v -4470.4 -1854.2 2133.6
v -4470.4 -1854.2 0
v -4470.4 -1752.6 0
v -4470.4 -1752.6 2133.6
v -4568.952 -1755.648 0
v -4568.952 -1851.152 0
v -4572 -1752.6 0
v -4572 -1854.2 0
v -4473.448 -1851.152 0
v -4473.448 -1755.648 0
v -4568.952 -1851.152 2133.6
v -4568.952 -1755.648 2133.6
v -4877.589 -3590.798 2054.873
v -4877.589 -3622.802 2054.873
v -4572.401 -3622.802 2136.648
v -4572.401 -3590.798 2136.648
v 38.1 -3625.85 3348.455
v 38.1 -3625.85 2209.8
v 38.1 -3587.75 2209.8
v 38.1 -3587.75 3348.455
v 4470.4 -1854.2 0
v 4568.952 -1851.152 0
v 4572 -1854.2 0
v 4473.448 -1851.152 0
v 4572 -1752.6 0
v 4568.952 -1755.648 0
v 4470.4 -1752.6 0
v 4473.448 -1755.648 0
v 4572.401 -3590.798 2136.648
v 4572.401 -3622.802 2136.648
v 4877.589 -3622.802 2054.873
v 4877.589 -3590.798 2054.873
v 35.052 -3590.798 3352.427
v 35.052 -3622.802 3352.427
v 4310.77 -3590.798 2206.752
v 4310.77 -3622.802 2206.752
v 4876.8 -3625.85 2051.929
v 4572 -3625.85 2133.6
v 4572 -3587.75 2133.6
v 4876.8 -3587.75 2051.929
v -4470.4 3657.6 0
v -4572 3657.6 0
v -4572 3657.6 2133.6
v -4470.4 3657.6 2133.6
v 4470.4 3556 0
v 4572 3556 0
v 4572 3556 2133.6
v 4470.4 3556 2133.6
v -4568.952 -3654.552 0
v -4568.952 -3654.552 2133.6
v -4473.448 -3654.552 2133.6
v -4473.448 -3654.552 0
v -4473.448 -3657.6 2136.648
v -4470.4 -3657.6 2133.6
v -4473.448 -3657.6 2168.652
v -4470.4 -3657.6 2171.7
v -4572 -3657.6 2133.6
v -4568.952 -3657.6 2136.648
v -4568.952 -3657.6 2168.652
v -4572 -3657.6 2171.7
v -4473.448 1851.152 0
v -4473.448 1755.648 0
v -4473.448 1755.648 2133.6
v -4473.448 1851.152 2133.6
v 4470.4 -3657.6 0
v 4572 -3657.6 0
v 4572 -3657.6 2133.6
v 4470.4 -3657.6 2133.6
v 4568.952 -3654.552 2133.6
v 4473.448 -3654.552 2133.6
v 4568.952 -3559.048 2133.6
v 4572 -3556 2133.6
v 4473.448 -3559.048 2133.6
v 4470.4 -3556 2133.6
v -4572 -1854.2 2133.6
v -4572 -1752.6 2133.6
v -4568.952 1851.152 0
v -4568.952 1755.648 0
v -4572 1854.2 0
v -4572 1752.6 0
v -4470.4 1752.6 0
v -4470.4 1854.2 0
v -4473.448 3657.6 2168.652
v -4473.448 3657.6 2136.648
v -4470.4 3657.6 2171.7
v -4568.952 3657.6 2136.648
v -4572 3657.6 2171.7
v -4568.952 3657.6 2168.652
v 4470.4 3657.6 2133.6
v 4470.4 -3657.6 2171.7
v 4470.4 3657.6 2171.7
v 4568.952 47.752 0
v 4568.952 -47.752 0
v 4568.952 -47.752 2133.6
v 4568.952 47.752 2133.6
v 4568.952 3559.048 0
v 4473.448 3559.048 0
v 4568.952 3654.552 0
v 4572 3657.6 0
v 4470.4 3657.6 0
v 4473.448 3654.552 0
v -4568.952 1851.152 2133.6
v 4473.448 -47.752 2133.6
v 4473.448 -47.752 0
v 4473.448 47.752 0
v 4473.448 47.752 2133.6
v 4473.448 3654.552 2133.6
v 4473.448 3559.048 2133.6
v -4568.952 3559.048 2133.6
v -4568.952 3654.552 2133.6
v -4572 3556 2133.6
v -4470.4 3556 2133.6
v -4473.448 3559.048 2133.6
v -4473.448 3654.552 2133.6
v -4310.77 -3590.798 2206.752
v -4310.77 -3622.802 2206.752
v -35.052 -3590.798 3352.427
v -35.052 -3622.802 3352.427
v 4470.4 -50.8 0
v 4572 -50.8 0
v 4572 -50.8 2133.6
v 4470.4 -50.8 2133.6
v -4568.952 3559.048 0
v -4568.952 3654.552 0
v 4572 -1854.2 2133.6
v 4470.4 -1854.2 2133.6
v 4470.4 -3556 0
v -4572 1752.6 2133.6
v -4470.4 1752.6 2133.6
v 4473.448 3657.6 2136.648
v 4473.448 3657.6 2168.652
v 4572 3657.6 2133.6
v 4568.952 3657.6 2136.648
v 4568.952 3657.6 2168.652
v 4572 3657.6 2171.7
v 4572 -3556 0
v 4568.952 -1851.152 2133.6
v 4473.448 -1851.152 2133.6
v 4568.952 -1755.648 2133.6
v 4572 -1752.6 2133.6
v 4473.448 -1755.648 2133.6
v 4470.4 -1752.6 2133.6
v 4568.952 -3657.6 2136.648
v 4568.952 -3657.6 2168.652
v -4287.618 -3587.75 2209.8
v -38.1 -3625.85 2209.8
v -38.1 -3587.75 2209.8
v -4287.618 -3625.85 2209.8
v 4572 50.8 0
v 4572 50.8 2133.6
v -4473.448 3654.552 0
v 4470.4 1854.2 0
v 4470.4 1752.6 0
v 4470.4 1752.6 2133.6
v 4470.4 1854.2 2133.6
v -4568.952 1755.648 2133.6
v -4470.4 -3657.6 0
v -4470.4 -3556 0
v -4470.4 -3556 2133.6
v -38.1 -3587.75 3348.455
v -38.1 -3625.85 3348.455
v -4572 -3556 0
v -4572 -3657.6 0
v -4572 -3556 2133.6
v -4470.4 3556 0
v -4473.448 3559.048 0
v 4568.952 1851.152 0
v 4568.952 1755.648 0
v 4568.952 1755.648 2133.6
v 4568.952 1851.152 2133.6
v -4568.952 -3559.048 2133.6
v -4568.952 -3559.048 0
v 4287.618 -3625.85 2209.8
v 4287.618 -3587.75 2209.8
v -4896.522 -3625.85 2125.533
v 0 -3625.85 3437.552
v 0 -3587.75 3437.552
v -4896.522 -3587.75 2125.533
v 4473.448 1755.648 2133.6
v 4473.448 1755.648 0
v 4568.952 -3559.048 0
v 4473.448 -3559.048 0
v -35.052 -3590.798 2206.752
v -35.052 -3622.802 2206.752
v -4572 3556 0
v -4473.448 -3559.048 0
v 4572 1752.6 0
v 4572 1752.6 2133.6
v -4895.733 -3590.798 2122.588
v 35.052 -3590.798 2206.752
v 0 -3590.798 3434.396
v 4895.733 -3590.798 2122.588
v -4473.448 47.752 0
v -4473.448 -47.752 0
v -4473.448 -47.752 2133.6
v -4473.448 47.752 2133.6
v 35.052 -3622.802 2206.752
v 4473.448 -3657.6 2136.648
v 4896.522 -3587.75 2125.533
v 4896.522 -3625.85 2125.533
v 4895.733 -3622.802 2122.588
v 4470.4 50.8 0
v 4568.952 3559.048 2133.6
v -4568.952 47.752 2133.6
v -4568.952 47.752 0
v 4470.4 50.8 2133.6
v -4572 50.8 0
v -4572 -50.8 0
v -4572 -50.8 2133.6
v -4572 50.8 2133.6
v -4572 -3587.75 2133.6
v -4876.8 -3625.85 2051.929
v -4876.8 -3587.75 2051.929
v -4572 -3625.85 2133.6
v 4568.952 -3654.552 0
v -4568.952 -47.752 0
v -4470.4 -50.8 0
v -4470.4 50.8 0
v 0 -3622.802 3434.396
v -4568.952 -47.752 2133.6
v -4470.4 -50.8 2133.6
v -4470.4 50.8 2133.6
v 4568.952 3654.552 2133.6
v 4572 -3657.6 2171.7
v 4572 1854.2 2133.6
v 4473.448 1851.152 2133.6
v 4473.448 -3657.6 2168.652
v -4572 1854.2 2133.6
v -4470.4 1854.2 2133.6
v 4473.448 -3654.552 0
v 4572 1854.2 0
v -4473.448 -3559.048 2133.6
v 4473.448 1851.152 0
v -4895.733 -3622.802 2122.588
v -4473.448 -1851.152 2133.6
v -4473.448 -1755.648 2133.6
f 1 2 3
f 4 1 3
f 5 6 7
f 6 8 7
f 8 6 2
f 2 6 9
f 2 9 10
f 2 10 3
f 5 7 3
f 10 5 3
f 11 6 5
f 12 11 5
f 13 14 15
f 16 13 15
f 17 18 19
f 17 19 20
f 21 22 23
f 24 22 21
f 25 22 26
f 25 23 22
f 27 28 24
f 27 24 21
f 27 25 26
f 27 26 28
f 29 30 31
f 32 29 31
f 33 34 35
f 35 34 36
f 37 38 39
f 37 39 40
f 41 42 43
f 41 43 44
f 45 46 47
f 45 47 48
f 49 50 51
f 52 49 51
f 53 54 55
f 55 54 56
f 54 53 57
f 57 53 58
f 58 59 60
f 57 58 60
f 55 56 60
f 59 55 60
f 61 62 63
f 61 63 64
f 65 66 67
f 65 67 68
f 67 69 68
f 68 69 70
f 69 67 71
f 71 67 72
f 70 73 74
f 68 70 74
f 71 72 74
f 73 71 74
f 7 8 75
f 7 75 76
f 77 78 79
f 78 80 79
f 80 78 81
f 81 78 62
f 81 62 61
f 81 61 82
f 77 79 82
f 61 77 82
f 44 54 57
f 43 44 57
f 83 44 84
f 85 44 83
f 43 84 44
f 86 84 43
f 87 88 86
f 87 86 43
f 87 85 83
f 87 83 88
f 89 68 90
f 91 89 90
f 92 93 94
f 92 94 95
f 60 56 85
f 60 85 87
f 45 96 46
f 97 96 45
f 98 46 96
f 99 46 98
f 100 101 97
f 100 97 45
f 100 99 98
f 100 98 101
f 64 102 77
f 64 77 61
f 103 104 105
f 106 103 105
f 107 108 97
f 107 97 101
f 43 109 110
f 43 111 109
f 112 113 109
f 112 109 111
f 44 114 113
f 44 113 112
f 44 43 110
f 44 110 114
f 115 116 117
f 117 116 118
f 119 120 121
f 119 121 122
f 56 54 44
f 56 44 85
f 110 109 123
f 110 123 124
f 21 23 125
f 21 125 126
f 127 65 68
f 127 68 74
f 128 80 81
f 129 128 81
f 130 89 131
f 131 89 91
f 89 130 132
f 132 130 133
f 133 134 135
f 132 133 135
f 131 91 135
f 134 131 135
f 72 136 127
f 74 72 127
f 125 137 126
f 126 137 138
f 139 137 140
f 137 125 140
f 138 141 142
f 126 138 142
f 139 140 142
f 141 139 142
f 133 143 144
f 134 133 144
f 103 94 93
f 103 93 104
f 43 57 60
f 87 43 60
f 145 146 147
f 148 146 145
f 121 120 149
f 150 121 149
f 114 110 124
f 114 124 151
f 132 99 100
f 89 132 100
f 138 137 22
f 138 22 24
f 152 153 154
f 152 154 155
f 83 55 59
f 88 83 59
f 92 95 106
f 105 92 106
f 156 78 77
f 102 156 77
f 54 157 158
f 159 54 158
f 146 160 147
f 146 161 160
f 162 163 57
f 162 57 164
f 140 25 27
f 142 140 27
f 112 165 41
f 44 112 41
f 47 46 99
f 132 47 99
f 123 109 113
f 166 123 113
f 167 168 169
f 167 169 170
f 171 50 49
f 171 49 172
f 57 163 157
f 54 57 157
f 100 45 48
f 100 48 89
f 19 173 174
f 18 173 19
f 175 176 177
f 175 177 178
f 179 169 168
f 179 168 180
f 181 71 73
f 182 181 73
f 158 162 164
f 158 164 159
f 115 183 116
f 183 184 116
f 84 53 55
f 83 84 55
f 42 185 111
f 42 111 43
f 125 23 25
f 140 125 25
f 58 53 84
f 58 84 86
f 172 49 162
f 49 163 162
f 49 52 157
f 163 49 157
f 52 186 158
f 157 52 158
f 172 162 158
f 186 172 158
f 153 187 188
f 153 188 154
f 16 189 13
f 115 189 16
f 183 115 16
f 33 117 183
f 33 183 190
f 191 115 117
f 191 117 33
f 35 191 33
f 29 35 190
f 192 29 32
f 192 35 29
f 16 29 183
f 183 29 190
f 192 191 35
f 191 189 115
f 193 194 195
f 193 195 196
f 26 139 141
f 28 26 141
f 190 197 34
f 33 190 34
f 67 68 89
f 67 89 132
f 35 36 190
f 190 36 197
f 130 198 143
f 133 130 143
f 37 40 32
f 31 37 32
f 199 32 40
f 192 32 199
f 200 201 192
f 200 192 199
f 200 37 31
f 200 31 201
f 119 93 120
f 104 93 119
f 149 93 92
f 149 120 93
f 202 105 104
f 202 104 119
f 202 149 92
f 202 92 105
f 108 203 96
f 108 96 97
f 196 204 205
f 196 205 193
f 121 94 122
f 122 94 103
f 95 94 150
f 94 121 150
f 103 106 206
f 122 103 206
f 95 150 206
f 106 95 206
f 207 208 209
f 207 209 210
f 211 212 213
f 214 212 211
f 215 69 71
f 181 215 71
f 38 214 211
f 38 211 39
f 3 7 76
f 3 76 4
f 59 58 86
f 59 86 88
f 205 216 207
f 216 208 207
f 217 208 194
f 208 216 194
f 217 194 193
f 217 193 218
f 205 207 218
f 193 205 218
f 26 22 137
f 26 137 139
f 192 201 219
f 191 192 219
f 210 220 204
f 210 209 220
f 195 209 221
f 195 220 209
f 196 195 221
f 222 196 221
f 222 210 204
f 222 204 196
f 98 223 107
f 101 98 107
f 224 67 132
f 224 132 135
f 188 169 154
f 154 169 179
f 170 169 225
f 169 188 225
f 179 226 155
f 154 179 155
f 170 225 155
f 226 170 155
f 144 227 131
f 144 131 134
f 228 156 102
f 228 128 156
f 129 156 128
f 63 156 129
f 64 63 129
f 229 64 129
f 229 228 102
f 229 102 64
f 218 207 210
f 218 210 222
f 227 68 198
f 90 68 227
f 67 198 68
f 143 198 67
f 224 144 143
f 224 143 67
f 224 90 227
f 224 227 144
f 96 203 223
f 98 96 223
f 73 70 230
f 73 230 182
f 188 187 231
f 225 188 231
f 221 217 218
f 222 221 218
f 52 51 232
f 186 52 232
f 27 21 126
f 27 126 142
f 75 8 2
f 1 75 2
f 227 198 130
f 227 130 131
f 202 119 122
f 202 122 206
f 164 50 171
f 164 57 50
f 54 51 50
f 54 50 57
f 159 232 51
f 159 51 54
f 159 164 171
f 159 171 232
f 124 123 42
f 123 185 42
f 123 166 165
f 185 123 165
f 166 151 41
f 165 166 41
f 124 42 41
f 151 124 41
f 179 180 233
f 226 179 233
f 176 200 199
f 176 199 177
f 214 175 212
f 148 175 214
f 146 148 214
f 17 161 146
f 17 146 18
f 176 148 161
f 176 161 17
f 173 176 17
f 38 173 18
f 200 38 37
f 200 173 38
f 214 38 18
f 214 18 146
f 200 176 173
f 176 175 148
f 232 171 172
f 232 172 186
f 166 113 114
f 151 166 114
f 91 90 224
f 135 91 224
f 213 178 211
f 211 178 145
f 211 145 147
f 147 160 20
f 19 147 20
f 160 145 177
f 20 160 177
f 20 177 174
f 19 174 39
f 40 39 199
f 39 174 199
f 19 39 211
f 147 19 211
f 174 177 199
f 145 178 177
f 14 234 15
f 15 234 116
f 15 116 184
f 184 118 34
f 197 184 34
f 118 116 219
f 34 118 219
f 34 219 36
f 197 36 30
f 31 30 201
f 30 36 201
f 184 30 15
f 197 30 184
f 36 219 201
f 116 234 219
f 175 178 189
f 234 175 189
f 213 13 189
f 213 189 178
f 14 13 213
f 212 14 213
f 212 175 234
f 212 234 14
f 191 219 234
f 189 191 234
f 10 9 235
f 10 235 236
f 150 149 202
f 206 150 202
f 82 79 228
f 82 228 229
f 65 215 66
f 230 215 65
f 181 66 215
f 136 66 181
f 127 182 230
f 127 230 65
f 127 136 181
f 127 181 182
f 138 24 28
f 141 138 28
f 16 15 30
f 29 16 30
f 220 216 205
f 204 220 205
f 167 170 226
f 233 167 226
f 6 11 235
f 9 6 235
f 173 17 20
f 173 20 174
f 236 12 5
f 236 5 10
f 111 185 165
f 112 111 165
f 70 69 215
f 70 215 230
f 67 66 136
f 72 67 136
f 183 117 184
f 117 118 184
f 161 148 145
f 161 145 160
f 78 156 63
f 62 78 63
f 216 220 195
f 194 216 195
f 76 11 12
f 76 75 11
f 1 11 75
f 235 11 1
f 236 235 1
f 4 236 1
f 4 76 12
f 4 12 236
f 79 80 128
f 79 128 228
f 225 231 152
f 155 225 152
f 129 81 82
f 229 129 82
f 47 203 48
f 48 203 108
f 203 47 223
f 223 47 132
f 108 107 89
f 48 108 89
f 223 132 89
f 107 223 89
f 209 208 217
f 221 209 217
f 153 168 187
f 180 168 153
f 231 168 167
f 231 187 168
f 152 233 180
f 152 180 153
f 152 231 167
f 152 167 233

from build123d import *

# Parameters (mm, degrees)
F5_W      = 101.6
F5_H      = 101.6
F6_DEPTH  = 2133.6
F7_T      = -3.048
F7_2_T    = -3.048
F7_3_T    = -3.048
F7_4_T    = -3.048
F7_5_T    = -3.048
F11_DEPTH = 19.05
F10_W     = 76.2
F10_H     = 76.2
F12_DEPTH = 19.05
F13_T     = -3.048
F14_W     = 101.6
F14_H     = 38.1
F15_DEPTH = 7315.2
F16_T     = -3.048


with BuildPart() as f6:
    # F5 (on Top) → F6 (new body)
    with BuildSketch(Plane.XY):
        with Locations((-4521.2, 3606.8)):
            Rectangle(F5_W, F5_H)
    extrude(amount=F6_DEPTH)

    # F7
    f7_openings = [f6.faces().sort_by_distance(p)[0] for p in [
        (-4521.2, 3606.8, 2133.6),
        (-4521.2, 3606.8, 0),
    ]]
    offset(amount=F7_T, openings=f7_openings)


with BuildPart() as f6b:
    # F5 (on Top) → F6, piece 2 (new body)
    with BuildSketch(Plane.XY):
        with Locations((-4521.2, 1803.4)):
            Rectangle(F5_W, F5_H)
    extrude(amount=F6_DEPTH)

    # F7#2
    f7_2_openings = [f6b.faces().sort_by_distance(p)[0] for p in [
        (-4521.2, 1803.4, 2133.6),
        (-4521.2, 1803.4, 0),
    ]]
    offset(amount=F7_2_T, openings=f7_2_openings)


with BuildPart() as f6c:
    # F5 (on Top) → F6, piece 3 (new body)
    with BuildSketch(Plane.XY):
        with Locations((-4521.2, 0)):
            Rectangle(F5_W, F5_H)
    extrude(amount=F6_DEPTH)

    # F7#3
    f7_3_openings = [f6c.faces().sort_by_distance(p)[0] for p in [
        (-4521.2, 0, 2133.6),
        (-4521.2, 0, 0),
    ]]
    offset(amount=F7_3_T, openings=f7_3_openings)


with BuildPart() as f6d:
    # F5 (on Top) → F6, piece 4 (new body)
    with BuildSketch(Plane.XY):
        with Locations((-4521.2, -1803.4)):
            Rectangle(F5_W, F5_H)
    extrude(amount=F6_DEPTH)

    # F7#4
    f7_4_openings = [f6d.faces().sort_by_distance(p)[0] for p in [
        (-4521.2, -1803.4, 2133.6),
        (-4521.2, -1803.4, 0),
    ]]
    offset(amount=F7_4_T, openings=f7_4_openings)


with BuildPart() as f6e:
    # F5 (on Top) → F6, piece 5 (new body)
    with BuildSketch(Plane.XY):
        with Locations((-4521.2, -3606.8)):
            Rectangle(F5_W, F5_H)
    extrude(amount=F6_DEPTH)

    # F7#5
    f7_5_openings = [f6e.faces().sort_by_distance(p)[0] for p in [
        (-4521.2, -3606.8, 2133.6),
        (-4521.2, -3606.8, 0),
    ]]
    offset(amount=F7_5_T, openings=f7_5_openings)


with BuildPart() as f8_1:
    # F8: instance of F6c
    add(f6c.part.mirror(Plane.YZ))


with BuildPart() as f8_2:
    # F8: instance of F6d
    add(f6d.part.mirror(Plane.YZ))


with BuildPart() as f8_3:
    # F8: instance of F6e
    add(f6e.part.mirror(Plane.YZ))


with BuildPart() as f8_4:
    # F8: instance of F6b
    add(f6b.part.mirror(Plane.YZ))


with BuildPart() as f8_5:
    # F8: instance of F6
    add(f6.part.mirror(Plane.YZ))


with BuildPart() as f11:
    # F10 (on mid) → F11 (new body, symmetric)
    with BuildSketch(Plane.XZ.offset(3606.8)):
        Polygon((-4572, 2133.6), (-4572, 2209.8), (-4287.6177284633, 2209.8), (-38.1, 3348.4548435635), (0, 3358.6637077951), (38.1, 3348.4548435635), (4287.6177284633, 2209.8), (4572, 2209.8), (4572, 2133.6), (4876.8, 2051.929086147), (4896.5220112368, 2125.5326341102), (0, 3437.5517527423), (-4896.5220112368, 2125.5326341102), (-4876.8, 2051.929086147), align=None)
        Polygon((-4287.6177284633, 2209.8), (-4572, 2209.8), (-4572, 2133.6), align=None)
        Polygon((4572, 2209.8), (4287.6177284633, 2209.8), (4572, 2133.6), align=None)
    extrude(amount=F11_DEPTH, both=True)

    # F10 (on mid) → F12 (join, symmetric)
    with BuildSketch(Plane.XZ.offset(3606.8)):
        Polygon((-38.1, 2209.8), (-4287.6177284633, 2209.8), (-4572, 2133.6), (-38.1, 2133.6), align=None)
        Polygon((4287.6177284633, 2209.8), (38.1, 2209.8), (38.1, 2133.6), (4572, 2133.6), align=None)
        with Locations((0, 2171.7)):
            Rectangle(F10_W, F10_H)
        Polygon((-38.1, 3348.4548435635), (-38.1, 2209.8), (38.1, 2209.8), (38.1, 3348.4548435635), (0, 3358.6637077951), align=None)
    extrude(amount=F12_DEPTH, both=True)

    # F13
    f13_openings = [f11.faces().sort_by_distance(p)[0] for p in [
        (4886.661006, -3606.8, 2088.73086),
        (-4886.661006, -3606.8, 2088.73086),
    ]]
    offset(amount=F13_T, openings=f13_openings, kind=Kind.INTERSECTION)


with BuildPart() as f15:
    # F14 (on face) → F15 (new body, through all)
    with BuildSketch(Plane.XZ.offset(3657.6)):
        with Locations((4521.2, 2152.65)):
            Rectangle(F14_W, F14_H)
    extrude(amount=-F15_DEPTH)

    # F16
    f16_openings = [f15.faces().sort_by_distance(p)[0] for p in [
        (4521.2, 3657.6, 2152.65),
        (4521.2, -3657.6, 2152.65),
    ]]
    offset(amount=F16_T, openings=f16_openings)


with BuildPart() as f17_1:
    # F17: instance of F15
    add(f15.part.mirror(Plane.YZ))


solid = Compound([f6.part, f6b.part, f6c.part, f6d.part, f6e.part, f8_1.part, f8_2.part, f8_3.part, f8_4.part, f8_5.part, f11.part, f15.part, f17_1.part])
